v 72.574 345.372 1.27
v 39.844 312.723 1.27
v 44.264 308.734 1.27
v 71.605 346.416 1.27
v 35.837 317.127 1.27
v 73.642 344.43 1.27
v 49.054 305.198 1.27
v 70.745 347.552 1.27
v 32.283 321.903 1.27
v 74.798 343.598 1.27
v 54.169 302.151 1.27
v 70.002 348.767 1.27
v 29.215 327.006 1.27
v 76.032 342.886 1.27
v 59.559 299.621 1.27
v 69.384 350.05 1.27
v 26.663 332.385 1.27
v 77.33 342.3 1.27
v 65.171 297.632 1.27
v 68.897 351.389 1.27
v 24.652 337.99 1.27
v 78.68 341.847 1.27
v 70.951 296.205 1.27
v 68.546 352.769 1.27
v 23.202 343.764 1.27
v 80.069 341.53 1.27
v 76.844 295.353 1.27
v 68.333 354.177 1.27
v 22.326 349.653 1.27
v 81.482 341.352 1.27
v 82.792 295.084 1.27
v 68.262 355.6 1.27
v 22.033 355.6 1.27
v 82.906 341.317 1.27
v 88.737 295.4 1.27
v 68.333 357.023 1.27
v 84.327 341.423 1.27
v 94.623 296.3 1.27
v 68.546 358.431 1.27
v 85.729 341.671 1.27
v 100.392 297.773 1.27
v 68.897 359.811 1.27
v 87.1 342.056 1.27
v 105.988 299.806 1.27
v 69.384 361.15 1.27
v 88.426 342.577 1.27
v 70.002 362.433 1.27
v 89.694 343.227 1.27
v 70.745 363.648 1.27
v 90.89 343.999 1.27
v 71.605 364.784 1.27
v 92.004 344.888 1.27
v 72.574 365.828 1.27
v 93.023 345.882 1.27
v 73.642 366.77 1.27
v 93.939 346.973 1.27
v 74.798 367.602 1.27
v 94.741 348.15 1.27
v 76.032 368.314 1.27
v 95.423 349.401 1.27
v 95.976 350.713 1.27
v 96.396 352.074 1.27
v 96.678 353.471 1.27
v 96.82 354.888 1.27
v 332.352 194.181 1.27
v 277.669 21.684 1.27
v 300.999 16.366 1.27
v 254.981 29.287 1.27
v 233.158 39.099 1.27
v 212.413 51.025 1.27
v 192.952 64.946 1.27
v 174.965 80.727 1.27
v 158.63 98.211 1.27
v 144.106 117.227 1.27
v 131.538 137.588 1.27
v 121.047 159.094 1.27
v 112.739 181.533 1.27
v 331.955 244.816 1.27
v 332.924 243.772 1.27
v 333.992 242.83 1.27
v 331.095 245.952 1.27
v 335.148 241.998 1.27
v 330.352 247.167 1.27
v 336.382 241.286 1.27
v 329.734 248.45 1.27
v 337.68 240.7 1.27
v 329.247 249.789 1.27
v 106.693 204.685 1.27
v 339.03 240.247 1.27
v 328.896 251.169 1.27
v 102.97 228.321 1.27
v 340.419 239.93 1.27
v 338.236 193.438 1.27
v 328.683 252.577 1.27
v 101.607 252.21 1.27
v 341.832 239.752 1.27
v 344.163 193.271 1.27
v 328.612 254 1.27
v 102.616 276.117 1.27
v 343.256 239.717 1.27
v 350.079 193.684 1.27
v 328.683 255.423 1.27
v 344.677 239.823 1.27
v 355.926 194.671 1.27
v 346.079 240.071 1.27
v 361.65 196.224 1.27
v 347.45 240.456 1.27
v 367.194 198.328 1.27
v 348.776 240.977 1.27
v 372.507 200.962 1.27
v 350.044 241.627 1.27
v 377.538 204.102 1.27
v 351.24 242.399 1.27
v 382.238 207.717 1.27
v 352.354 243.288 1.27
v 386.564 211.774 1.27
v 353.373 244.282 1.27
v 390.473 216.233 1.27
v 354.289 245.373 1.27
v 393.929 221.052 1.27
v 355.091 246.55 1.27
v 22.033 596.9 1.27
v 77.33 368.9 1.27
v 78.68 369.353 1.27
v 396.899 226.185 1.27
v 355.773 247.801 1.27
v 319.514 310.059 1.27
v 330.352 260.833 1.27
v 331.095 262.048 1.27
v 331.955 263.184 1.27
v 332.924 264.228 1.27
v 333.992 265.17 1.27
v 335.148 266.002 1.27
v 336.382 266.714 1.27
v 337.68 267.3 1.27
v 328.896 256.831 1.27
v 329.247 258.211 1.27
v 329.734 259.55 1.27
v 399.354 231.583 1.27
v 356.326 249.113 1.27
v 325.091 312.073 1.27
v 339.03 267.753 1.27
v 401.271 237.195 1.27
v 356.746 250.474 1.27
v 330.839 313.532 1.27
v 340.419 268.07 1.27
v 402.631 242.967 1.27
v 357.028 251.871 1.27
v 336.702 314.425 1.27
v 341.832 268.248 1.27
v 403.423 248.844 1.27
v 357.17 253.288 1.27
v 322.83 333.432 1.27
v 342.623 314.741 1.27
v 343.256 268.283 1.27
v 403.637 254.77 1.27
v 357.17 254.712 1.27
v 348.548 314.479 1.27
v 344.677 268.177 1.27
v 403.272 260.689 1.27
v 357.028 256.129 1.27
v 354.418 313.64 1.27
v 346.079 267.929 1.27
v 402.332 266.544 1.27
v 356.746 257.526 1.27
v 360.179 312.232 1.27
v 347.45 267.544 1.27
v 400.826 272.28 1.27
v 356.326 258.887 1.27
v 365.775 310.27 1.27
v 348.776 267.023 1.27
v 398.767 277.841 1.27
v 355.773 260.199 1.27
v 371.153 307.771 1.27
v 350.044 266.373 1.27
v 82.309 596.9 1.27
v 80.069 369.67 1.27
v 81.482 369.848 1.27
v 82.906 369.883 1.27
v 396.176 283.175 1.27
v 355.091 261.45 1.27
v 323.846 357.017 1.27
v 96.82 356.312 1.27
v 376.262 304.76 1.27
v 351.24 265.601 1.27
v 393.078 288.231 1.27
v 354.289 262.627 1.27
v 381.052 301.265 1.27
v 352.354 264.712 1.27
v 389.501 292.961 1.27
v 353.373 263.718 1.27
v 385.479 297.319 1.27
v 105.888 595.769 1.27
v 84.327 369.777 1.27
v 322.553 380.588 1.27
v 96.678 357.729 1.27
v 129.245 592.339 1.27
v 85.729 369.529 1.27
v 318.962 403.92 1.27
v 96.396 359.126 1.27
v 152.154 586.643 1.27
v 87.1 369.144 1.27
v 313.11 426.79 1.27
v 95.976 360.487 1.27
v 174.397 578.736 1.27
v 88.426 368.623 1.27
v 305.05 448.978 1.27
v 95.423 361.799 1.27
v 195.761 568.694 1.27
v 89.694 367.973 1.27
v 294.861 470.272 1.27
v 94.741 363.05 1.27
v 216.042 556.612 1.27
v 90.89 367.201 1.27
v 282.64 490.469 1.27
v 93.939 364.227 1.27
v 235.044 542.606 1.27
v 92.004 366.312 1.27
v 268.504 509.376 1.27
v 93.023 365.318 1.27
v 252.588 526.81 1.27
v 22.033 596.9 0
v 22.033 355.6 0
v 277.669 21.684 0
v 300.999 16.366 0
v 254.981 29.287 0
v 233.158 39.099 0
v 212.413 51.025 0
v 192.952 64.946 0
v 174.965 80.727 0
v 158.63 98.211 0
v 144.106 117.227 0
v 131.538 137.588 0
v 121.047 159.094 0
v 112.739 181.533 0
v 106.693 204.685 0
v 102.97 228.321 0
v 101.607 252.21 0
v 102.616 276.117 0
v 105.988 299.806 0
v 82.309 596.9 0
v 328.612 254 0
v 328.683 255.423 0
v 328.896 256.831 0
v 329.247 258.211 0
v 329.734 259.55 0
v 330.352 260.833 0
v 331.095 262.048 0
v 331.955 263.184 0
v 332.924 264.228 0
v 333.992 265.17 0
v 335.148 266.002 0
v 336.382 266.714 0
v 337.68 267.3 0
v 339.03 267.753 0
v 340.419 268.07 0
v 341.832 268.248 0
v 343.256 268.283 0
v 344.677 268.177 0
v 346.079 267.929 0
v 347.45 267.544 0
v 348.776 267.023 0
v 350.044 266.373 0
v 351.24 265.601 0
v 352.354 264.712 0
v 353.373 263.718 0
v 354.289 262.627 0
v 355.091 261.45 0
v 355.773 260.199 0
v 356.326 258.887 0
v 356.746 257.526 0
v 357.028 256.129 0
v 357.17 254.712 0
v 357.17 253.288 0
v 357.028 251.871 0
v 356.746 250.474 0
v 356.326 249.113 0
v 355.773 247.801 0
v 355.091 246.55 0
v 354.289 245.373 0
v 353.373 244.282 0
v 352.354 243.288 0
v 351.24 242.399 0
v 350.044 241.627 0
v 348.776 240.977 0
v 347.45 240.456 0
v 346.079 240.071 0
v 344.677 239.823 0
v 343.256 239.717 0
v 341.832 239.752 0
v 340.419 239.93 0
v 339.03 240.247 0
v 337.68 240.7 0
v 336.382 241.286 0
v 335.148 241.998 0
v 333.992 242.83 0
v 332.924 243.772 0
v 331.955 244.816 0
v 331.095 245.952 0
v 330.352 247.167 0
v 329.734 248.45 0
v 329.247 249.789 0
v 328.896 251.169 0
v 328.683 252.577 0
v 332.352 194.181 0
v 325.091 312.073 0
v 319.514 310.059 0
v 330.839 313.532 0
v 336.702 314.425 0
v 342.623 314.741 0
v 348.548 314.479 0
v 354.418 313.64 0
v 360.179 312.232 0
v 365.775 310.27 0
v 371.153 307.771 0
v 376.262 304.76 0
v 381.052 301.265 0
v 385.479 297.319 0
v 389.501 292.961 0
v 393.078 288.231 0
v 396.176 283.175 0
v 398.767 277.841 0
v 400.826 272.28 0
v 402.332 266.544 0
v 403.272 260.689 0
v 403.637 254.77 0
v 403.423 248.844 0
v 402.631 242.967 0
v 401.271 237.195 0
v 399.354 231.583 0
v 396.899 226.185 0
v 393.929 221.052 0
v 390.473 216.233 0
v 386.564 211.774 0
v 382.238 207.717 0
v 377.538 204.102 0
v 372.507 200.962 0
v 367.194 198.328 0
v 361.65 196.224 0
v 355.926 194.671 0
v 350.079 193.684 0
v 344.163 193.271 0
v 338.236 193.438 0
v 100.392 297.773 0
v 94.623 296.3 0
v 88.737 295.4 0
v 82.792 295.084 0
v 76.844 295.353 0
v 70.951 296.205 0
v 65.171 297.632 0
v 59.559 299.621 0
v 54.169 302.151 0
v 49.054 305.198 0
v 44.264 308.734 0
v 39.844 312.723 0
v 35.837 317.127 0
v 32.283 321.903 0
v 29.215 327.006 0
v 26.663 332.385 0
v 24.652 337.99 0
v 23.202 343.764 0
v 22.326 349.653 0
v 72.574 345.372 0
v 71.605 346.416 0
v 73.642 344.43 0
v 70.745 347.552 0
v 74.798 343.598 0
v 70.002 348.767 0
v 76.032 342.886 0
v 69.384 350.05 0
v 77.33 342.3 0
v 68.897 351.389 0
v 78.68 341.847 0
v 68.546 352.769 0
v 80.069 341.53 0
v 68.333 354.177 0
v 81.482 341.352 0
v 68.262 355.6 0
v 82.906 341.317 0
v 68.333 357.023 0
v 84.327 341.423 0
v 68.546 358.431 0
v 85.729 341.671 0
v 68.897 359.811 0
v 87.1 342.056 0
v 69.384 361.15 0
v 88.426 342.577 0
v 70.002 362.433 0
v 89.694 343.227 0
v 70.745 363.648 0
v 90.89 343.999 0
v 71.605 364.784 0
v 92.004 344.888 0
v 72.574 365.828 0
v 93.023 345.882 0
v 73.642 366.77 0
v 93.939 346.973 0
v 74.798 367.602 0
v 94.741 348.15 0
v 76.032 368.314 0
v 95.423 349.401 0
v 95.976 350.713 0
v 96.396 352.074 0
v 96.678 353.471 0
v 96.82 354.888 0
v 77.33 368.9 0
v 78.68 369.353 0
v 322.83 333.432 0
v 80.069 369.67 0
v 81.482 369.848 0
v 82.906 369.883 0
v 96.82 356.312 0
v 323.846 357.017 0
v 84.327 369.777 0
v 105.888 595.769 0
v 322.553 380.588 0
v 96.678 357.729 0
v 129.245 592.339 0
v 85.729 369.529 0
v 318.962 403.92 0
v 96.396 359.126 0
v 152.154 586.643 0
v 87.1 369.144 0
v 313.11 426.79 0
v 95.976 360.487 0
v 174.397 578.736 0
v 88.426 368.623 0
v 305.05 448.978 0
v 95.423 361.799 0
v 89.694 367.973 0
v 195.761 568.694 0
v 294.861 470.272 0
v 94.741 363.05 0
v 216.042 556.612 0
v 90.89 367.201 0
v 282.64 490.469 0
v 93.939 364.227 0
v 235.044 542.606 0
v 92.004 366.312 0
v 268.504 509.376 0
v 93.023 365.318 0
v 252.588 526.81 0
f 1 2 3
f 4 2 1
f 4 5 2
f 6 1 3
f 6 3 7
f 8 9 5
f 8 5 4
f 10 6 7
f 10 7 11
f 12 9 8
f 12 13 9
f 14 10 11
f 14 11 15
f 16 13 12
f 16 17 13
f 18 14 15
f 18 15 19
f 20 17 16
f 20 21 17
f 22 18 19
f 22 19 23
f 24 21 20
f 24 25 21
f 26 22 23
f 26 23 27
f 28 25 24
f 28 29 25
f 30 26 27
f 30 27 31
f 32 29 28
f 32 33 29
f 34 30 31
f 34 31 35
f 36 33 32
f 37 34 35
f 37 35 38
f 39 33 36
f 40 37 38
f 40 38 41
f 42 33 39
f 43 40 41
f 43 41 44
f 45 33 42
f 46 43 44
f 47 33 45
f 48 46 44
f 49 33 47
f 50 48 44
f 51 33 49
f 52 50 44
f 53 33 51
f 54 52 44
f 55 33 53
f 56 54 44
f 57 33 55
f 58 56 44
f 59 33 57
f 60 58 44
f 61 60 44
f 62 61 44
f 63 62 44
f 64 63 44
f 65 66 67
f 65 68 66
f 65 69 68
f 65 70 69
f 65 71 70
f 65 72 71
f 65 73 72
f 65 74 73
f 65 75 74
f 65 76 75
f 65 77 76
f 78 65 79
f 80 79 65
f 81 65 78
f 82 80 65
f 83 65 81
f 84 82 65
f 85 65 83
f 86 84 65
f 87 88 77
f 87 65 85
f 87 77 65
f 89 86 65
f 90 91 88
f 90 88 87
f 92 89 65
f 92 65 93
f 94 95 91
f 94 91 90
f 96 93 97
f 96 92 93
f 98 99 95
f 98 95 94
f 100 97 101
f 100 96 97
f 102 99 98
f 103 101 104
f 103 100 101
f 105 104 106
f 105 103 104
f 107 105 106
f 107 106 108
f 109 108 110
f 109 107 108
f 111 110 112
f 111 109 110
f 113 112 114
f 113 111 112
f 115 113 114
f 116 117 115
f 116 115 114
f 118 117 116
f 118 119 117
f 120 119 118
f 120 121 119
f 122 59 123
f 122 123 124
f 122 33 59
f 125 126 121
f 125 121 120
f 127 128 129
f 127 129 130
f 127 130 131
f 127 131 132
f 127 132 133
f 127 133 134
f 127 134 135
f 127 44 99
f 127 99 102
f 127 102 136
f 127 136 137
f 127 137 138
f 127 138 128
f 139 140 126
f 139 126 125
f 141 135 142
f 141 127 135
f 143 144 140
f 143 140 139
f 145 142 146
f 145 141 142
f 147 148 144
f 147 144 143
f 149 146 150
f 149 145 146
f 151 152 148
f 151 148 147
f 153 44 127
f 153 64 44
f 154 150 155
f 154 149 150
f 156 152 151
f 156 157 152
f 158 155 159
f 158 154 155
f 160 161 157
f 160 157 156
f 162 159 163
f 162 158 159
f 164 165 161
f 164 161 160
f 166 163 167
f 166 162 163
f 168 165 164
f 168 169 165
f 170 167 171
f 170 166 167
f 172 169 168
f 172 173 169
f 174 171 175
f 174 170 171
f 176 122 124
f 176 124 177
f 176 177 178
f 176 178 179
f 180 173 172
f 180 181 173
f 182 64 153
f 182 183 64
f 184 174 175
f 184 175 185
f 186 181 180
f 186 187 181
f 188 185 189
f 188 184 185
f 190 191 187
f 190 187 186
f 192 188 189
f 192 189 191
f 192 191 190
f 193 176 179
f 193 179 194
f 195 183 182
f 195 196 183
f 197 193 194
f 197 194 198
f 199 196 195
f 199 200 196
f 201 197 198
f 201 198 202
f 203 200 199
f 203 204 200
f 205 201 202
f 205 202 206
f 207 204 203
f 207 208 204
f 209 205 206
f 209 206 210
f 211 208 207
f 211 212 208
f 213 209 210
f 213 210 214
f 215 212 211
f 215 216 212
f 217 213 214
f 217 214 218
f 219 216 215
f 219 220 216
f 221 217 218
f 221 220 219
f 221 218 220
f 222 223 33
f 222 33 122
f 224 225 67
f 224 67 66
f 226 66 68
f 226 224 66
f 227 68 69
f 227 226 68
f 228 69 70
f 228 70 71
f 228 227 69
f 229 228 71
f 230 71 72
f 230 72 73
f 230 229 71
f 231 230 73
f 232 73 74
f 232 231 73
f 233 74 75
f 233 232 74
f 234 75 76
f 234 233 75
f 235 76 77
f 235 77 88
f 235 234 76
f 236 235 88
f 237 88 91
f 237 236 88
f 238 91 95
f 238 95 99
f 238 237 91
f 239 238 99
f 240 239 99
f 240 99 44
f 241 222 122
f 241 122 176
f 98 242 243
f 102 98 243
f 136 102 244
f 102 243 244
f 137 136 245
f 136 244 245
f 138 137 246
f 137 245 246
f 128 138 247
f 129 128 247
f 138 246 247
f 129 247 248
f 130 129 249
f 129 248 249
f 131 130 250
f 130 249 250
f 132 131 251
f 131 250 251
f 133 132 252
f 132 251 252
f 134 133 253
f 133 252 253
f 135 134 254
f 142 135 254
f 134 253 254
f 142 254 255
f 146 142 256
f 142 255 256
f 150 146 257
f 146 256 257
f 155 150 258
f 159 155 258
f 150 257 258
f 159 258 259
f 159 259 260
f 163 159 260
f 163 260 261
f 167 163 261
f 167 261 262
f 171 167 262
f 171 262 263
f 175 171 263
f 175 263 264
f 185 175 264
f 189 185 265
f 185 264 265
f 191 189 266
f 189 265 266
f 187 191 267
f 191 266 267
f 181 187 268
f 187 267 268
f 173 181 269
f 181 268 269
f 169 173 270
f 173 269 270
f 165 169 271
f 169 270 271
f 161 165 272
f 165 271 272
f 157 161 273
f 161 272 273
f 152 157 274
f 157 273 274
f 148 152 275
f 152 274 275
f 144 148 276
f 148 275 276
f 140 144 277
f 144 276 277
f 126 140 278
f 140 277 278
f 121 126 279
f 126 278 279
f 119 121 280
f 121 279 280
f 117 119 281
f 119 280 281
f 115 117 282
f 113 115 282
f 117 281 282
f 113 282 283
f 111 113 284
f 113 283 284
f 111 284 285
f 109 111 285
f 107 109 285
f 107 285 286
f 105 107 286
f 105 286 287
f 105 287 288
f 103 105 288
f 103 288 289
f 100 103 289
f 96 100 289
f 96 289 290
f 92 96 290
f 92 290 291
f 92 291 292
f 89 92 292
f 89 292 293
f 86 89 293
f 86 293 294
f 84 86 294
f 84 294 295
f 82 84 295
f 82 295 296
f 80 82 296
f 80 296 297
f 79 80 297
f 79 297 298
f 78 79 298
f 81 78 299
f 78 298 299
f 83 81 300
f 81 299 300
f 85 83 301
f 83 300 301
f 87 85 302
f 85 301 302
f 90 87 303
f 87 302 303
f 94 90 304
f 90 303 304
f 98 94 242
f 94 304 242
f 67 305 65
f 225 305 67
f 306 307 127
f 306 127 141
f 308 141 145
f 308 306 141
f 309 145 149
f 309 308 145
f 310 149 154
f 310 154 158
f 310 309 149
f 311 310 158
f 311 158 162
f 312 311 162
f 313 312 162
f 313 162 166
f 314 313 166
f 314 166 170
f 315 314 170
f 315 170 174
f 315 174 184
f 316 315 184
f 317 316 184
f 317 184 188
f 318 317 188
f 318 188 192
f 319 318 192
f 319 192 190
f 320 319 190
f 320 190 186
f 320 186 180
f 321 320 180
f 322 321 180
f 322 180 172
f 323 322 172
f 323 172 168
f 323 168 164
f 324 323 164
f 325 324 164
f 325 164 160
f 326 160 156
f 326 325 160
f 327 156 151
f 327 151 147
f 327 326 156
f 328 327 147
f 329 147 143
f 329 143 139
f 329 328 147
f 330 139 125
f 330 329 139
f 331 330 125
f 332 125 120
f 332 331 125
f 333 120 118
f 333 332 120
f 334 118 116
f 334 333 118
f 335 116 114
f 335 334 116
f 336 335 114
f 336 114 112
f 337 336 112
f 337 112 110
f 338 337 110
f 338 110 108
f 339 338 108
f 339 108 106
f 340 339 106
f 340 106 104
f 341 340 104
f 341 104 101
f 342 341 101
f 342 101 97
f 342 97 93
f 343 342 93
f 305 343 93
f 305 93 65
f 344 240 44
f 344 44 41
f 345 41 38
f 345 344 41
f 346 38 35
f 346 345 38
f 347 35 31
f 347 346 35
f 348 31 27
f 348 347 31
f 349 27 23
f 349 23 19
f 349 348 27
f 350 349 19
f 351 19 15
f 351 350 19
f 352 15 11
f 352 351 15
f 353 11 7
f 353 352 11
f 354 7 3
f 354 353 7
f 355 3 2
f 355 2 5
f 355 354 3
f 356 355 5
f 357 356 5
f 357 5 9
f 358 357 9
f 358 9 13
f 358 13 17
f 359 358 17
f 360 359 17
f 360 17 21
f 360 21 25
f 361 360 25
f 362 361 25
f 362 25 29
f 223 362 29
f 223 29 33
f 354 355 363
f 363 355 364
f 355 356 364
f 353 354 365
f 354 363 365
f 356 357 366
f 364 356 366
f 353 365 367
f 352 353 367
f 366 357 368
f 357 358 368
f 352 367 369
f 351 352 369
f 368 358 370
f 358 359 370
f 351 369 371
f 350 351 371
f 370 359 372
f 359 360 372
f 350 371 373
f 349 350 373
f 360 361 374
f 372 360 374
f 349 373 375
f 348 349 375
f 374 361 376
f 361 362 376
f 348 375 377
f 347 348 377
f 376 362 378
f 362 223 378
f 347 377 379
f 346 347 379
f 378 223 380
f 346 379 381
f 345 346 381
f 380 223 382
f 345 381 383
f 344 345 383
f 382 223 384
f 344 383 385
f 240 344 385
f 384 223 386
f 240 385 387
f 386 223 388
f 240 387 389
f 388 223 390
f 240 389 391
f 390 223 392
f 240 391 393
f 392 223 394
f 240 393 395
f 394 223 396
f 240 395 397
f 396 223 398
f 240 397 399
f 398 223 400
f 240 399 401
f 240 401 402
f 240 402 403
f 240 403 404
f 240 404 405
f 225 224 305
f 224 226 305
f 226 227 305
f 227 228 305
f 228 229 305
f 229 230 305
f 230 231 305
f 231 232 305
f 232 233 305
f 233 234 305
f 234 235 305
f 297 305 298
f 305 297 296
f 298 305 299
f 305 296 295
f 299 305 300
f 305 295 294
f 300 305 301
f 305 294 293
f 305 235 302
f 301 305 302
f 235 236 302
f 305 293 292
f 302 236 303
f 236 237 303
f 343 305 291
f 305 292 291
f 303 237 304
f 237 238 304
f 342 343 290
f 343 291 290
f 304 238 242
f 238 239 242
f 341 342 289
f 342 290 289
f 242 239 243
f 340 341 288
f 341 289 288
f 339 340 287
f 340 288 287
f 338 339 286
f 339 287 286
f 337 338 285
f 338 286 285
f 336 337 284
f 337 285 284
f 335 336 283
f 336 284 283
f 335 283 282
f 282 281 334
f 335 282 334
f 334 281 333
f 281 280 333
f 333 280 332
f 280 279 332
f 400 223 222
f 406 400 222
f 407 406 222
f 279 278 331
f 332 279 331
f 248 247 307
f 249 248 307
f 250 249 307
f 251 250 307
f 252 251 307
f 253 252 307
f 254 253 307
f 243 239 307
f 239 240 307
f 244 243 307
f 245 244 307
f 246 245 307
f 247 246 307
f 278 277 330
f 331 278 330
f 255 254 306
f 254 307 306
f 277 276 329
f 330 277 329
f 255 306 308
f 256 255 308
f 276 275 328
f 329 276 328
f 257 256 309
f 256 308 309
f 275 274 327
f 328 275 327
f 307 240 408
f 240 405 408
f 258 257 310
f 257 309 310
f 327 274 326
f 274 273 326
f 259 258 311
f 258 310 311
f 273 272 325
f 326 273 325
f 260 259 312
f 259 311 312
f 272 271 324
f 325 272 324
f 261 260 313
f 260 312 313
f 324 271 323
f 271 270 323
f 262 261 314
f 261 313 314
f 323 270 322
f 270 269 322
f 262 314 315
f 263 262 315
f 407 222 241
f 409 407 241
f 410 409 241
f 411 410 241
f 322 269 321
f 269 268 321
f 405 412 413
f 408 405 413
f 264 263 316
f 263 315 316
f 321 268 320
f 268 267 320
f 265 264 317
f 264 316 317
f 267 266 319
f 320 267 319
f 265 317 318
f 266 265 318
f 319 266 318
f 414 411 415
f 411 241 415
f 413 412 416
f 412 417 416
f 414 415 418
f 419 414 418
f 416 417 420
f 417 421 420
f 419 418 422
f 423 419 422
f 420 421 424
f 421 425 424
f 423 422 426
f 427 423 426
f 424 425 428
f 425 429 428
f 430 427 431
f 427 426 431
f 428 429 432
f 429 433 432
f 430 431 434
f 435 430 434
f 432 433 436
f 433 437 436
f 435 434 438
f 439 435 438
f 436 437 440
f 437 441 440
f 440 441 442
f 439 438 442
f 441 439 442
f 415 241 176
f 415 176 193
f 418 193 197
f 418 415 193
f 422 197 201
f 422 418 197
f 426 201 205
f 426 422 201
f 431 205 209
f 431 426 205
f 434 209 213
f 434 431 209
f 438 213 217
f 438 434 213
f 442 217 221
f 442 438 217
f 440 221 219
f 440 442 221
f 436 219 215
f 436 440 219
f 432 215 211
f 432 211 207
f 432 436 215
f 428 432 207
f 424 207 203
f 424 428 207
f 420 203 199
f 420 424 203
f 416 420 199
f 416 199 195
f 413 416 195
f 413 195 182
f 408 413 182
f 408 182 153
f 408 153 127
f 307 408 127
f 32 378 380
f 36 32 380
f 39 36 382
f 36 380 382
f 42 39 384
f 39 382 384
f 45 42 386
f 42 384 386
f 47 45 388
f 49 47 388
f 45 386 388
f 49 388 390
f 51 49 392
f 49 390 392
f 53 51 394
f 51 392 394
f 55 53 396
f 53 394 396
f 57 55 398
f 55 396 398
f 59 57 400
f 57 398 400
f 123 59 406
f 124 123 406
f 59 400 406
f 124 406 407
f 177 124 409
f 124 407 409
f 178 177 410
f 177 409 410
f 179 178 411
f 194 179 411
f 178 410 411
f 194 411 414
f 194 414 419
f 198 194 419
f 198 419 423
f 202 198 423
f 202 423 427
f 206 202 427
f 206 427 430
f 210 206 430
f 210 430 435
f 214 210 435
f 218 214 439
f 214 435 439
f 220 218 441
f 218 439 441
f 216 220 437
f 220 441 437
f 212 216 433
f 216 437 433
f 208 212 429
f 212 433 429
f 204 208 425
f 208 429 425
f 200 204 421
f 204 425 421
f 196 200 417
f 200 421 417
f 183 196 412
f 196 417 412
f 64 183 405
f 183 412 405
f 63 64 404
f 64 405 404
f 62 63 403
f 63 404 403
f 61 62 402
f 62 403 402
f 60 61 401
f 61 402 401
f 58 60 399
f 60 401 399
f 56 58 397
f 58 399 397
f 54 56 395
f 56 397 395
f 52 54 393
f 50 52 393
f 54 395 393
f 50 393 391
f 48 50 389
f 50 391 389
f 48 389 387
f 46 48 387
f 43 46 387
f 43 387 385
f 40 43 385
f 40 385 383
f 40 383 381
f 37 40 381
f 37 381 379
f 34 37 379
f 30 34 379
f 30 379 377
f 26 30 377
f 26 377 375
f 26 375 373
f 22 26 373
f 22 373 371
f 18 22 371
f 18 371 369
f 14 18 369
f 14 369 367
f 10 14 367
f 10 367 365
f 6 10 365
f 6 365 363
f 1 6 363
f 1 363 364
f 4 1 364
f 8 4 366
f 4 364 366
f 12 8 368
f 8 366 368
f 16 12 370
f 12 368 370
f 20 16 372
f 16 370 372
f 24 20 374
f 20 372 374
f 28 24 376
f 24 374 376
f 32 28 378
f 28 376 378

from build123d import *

# Parameters (mm, degrees)
SKETCH1_W           = 431.8
SKETCH1_H           = 609.6
BOSS_EXTRUDE1_DEPTH = 1.27
SKETCH2_R           = 14.2875
CUT_EXTRUDE1_DEPTH  = 1.27
SKETCH3_OUTSIDE_W   = 583.208
SKETCH3_OUTSIDE_H   = 761.008
CUT_EXTRUDE2_DEPTH  = 2.54


with BuildPart() as part:
    # Sketch1 → Boss-Extrude1 (new body)
    with BuildSketch(Plane.XY):
        with Locations((215.9, 304.8)):
            Rectangle(SKETCH1_W, SKETCH1_H)
    extrude(amount=BOSS_EXTRUDE1_DEPTH)

    # Sketch2 → Cut-Extrude1 (cut)
    with BuildSketch(Plane(origin=(0, 0, 0), x_dir=(-1, 0, 0), z_dir=(0, 0, -1))):
        with Locations((-82.55, 355.6)):
            Circle(SKETCH2_R)
        with Locations((-342.9, 254)):
            Circle(SKETCH2_R)
    extrude(amount=-CUT_EXTRUDE1_DEPTH, mode=Mode.SUBTRACT)

    # Sketch3 outside → Cut-Extrude2 (cut)
    with BuildSketch(Plane(origin=(0, 0, 0), x_dir=(-1, 0, 0), z_dir=(0, 0, -1))):
        with Locations((-215.9, 304.8)):
            Rectangle(SKETCH3_OUTSIDE_W, SKETCH3_OUTSIDE_H)
        with BuildLine():
            Line((-332.352291022, 194.180969832), (-300.998694729, 16.365889198))
            ThreePointArc((-300.998694729, 16.365889198), (-144.106457916, 117.227131251), (-105.987607355, 299.806202759))
            ThreePointArc((-105.987607355, 299.806202759), (-49.054456035, 305.198434711), (-22.033314292, 355.6))
            Line((-22.033314292, 355.6), (-22.033314292, 596.899879542))
            Line((-22.033314292, 596.899879542), (-82.308891716, 596.899879542))
            ThreePointArc((-82.308891716, 596.899879542), (-268.503650886, 509.375582335), (-319.513573185, 310.059304096))
            ThreePointArc((-319.513573185, 310.059304096), (-403.272414901, 260.688950139), (-332.352291022, 194.180969832))
        make_face(mode=Mode.SUBTRACT)
    extrude(amount=-CUT_EXTRUDE2_DEPTH, mode=Mode.SUBTRACT)


solid = part.part
